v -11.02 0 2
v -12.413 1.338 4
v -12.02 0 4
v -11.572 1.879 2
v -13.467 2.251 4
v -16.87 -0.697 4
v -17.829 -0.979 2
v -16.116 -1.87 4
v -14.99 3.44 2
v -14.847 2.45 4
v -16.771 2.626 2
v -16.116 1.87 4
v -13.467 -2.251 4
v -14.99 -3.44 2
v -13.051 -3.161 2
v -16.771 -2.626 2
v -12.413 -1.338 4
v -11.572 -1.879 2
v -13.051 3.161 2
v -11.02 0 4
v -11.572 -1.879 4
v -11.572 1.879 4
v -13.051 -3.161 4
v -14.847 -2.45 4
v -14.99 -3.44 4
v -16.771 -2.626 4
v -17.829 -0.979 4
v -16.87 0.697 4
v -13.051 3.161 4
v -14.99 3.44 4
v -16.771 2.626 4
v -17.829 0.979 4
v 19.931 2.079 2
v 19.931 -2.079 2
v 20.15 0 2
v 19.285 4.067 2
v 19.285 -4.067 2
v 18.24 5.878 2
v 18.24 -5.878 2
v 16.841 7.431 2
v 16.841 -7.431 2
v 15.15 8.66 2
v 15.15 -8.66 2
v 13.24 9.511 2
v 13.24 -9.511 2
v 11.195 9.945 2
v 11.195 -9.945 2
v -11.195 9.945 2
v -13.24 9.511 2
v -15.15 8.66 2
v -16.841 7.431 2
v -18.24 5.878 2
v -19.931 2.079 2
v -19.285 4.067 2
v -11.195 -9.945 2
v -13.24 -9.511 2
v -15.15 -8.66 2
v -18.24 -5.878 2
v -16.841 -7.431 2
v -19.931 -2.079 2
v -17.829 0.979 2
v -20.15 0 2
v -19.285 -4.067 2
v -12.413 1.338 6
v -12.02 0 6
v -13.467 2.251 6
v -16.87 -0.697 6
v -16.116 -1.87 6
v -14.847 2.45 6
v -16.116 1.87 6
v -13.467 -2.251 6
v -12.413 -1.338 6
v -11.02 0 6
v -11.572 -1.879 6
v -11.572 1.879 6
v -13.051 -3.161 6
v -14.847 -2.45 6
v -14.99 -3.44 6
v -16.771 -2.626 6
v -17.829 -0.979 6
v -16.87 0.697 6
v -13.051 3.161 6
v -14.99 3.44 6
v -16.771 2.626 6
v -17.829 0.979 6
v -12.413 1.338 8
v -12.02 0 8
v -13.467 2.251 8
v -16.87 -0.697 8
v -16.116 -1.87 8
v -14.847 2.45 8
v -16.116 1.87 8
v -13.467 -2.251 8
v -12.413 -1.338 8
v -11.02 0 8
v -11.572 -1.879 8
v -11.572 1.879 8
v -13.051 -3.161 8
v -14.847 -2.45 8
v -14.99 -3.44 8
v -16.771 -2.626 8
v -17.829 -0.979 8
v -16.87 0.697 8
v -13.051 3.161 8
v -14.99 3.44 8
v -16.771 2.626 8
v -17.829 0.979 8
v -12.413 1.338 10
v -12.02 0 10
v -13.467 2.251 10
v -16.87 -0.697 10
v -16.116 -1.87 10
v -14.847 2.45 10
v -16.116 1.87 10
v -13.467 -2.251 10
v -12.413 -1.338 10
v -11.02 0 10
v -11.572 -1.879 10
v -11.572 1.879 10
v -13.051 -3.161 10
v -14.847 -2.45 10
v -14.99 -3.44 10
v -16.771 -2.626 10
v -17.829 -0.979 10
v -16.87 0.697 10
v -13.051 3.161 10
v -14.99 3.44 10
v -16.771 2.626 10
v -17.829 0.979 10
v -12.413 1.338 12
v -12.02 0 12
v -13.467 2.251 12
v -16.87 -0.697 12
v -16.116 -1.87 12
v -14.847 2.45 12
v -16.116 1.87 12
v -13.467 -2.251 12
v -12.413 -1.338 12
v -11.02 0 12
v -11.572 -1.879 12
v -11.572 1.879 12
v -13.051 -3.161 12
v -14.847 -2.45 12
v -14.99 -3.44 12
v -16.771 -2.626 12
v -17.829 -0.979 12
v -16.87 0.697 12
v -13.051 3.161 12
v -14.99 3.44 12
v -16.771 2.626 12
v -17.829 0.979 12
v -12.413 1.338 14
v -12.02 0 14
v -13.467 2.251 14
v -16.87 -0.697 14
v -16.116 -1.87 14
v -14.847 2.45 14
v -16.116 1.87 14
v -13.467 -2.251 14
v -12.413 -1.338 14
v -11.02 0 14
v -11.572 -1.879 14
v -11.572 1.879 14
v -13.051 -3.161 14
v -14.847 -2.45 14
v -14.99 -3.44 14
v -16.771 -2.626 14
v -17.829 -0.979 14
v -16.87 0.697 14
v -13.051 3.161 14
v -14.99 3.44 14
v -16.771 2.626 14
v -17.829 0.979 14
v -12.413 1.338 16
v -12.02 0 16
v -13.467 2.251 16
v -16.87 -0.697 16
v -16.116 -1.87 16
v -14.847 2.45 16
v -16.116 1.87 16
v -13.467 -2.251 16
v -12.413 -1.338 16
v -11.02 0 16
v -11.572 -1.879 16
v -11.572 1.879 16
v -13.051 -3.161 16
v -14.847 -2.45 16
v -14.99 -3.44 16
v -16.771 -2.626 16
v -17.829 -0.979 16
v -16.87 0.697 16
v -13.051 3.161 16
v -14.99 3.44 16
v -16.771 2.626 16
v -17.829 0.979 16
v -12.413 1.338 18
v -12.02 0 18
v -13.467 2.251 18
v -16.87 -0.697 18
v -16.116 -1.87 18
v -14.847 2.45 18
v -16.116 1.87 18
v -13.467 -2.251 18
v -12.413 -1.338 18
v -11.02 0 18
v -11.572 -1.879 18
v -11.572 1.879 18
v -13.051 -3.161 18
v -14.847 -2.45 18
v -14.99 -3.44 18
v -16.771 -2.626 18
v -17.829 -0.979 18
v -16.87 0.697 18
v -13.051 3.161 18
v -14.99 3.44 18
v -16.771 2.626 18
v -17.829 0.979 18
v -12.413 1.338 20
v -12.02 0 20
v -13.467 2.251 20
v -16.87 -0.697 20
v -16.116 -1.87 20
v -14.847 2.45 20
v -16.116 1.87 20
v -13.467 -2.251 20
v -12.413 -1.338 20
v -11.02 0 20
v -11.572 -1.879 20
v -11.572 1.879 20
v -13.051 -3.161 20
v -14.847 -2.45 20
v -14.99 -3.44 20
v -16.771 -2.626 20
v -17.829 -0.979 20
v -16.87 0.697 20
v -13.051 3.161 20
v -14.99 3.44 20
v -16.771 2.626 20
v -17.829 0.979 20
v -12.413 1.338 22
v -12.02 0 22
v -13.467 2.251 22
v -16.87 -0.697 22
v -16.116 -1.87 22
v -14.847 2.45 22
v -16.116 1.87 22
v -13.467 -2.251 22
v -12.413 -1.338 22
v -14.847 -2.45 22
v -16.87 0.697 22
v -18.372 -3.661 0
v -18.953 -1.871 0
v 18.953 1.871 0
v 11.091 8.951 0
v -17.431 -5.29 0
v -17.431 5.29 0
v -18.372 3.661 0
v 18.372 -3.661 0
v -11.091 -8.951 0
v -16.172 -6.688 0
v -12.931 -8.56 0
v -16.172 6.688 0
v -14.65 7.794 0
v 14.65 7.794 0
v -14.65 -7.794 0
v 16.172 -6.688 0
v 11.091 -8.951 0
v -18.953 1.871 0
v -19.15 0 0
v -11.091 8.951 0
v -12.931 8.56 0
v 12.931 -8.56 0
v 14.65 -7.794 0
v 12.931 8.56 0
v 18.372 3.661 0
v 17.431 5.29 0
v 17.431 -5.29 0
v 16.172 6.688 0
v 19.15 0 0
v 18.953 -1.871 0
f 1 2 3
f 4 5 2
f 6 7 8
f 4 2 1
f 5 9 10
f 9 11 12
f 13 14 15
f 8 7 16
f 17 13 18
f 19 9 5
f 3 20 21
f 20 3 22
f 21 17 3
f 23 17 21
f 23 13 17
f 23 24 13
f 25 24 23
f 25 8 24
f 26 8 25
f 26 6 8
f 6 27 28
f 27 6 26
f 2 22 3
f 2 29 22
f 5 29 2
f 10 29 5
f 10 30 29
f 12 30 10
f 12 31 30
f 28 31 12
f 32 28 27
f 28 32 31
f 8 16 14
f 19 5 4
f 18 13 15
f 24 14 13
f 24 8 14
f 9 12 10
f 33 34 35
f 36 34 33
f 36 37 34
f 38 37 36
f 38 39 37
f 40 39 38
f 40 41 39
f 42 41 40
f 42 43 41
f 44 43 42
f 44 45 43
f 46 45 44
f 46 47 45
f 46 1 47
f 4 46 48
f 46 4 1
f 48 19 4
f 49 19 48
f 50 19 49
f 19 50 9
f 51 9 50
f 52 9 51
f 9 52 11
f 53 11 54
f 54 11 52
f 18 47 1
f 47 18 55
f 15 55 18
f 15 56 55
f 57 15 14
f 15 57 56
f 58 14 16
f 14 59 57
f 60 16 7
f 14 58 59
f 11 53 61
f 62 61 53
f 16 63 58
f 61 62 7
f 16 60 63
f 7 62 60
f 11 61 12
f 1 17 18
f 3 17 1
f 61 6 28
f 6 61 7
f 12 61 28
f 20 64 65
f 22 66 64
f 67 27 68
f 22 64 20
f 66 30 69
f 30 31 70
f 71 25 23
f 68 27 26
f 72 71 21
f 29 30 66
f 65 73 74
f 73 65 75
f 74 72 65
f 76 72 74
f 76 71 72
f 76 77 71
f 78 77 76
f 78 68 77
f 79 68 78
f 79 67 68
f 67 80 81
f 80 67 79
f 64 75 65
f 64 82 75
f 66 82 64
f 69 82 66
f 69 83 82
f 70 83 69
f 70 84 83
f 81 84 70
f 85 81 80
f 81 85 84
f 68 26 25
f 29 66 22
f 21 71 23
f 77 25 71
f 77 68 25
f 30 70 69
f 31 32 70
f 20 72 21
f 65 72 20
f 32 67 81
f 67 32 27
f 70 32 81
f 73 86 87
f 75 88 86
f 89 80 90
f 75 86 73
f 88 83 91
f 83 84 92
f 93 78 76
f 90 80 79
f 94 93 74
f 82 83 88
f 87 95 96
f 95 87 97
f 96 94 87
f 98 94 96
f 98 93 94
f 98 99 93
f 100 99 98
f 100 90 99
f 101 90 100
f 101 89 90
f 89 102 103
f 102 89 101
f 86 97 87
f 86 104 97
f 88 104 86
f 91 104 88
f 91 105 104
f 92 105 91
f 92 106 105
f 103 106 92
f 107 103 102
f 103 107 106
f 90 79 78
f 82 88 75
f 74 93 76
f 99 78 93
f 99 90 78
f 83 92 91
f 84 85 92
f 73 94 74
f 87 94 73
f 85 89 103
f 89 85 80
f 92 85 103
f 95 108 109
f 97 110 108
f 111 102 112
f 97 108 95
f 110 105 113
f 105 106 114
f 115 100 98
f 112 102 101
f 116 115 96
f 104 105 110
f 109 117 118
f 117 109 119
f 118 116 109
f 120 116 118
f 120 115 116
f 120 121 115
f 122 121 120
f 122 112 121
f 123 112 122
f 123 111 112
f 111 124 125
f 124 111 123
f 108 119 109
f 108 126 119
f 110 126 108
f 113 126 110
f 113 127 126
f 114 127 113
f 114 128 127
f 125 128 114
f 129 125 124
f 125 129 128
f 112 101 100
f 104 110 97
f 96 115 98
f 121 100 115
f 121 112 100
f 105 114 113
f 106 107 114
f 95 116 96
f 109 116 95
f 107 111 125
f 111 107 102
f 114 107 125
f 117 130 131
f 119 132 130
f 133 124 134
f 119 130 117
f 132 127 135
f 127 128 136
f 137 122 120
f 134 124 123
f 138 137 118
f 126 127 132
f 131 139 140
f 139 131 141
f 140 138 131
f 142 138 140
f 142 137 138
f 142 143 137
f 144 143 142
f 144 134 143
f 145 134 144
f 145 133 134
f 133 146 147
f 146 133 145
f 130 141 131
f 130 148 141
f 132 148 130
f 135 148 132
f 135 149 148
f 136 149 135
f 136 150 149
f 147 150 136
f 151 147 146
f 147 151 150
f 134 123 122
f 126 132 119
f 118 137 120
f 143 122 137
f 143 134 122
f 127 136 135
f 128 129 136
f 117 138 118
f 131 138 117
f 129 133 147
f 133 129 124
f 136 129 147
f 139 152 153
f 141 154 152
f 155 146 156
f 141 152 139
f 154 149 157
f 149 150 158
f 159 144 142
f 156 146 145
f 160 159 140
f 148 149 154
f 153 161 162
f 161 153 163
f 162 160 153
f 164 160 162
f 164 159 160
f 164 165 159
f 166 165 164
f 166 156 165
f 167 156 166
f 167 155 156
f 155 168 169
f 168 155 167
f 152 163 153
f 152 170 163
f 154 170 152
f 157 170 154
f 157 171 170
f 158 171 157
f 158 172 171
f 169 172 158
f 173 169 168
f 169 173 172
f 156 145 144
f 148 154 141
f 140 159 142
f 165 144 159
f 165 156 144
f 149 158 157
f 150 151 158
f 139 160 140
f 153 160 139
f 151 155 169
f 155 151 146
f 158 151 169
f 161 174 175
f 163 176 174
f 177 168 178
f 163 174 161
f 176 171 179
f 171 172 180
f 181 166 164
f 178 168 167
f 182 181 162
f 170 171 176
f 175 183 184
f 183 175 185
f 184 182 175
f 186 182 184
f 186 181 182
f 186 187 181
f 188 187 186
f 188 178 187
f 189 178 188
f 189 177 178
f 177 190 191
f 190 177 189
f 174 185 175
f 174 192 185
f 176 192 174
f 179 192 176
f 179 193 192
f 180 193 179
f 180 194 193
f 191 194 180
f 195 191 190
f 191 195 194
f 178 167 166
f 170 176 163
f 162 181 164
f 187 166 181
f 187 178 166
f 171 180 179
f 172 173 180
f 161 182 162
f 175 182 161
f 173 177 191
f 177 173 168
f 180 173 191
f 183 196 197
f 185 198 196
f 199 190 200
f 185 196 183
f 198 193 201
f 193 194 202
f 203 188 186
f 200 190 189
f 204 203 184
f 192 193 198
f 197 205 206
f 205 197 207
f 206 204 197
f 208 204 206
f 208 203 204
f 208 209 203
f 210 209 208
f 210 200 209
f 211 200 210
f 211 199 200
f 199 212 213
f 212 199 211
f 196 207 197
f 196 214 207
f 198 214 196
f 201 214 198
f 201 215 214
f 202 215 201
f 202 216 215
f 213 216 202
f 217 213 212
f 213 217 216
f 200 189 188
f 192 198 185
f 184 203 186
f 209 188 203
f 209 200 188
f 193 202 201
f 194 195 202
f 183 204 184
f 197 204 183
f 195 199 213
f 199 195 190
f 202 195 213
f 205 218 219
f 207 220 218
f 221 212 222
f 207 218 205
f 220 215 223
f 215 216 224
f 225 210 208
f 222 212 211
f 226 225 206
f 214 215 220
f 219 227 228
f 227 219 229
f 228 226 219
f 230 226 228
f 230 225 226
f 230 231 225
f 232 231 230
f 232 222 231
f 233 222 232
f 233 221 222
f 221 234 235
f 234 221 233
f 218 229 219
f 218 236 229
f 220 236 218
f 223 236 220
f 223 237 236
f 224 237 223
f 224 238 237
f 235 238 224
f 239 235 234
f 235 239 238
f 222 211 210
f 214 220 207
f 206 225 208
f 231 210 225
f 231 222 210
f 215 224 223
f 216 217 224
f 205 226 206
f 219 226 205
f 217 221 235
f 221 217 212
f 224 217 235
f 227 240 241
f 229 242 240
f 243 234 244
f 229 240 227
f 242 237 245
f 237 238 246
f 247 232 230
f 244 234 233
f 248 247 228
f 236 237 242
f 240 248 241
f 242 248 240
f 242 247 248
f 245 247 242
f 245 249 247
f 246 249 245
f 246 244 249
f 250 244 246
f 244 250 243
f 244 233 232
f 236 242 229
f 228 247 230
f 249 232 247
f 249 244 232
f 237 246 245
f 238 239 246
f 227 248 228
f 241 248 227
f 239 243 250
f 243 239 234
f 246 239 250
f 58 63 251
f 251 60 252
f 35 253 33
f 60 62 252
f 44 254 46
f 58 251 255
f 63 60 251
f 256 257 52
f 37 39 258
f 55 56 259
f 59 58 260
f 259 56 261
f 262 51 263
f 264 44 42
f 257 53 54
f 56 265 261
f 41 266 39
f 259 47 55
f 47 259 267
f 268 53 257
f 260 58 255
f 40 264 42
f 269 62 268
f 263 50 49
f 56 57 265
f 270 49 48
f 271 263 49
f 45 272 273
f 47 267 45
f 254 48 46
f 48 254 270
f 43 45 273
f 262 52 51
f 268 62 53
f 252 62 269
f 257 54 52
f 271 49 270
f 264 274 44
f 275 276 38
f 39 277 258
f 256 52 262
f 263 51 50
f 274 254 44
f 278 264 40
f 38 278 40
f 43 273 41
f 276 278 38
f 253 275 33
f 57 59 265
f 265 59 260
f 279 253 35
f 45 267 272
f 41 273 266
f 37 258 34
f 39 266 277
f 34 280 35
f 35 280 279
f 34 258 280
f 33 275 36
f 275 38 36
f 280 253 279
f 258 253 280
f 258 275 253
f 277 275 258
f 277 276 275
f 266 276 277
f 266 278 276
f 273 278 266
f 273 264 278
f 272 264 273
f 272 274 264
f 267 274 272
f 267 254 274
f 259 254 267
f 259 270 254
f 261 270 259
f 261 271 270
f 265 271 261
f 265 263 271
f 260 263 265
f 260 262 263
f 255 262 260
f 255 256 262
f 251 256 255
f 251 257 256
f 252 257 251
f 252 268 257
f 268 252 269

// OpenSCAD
w=20;
h=40.3;
t=2;
tab_offset=18;
tab_w=12.12;
tab_h=0;
tab_t=0;
insert_s=19.75;
post_d=6.95;
post_center_center_s= (32.74+25.24)/2;

//cap
hull() {
  center_center_s = h-w;
  translate([center_center_s/2, 0, 0]) cylinder(d2=w,d1=w-t,h=t);
  translate([-center_center_s/2, 0, 0]) cylinder(d2=w,d1=w-t,h=t);
}
rib_s=1;
translate([0,0,t]) {
  for (rib=[0:rib_s*2:insert_s]) {
    hull() {
//      translate([post_center_center_s/2, 0, rib]) cylinder(d2=post_d-rib_s*2,d1=post_d,h=rib_s*2);
      translate([-post_center_center_s/2, 0, rib]) cylinder(d2=post_d-rib_s*2,d1=post_d,h=rib_s*2);
    }
  }
}
